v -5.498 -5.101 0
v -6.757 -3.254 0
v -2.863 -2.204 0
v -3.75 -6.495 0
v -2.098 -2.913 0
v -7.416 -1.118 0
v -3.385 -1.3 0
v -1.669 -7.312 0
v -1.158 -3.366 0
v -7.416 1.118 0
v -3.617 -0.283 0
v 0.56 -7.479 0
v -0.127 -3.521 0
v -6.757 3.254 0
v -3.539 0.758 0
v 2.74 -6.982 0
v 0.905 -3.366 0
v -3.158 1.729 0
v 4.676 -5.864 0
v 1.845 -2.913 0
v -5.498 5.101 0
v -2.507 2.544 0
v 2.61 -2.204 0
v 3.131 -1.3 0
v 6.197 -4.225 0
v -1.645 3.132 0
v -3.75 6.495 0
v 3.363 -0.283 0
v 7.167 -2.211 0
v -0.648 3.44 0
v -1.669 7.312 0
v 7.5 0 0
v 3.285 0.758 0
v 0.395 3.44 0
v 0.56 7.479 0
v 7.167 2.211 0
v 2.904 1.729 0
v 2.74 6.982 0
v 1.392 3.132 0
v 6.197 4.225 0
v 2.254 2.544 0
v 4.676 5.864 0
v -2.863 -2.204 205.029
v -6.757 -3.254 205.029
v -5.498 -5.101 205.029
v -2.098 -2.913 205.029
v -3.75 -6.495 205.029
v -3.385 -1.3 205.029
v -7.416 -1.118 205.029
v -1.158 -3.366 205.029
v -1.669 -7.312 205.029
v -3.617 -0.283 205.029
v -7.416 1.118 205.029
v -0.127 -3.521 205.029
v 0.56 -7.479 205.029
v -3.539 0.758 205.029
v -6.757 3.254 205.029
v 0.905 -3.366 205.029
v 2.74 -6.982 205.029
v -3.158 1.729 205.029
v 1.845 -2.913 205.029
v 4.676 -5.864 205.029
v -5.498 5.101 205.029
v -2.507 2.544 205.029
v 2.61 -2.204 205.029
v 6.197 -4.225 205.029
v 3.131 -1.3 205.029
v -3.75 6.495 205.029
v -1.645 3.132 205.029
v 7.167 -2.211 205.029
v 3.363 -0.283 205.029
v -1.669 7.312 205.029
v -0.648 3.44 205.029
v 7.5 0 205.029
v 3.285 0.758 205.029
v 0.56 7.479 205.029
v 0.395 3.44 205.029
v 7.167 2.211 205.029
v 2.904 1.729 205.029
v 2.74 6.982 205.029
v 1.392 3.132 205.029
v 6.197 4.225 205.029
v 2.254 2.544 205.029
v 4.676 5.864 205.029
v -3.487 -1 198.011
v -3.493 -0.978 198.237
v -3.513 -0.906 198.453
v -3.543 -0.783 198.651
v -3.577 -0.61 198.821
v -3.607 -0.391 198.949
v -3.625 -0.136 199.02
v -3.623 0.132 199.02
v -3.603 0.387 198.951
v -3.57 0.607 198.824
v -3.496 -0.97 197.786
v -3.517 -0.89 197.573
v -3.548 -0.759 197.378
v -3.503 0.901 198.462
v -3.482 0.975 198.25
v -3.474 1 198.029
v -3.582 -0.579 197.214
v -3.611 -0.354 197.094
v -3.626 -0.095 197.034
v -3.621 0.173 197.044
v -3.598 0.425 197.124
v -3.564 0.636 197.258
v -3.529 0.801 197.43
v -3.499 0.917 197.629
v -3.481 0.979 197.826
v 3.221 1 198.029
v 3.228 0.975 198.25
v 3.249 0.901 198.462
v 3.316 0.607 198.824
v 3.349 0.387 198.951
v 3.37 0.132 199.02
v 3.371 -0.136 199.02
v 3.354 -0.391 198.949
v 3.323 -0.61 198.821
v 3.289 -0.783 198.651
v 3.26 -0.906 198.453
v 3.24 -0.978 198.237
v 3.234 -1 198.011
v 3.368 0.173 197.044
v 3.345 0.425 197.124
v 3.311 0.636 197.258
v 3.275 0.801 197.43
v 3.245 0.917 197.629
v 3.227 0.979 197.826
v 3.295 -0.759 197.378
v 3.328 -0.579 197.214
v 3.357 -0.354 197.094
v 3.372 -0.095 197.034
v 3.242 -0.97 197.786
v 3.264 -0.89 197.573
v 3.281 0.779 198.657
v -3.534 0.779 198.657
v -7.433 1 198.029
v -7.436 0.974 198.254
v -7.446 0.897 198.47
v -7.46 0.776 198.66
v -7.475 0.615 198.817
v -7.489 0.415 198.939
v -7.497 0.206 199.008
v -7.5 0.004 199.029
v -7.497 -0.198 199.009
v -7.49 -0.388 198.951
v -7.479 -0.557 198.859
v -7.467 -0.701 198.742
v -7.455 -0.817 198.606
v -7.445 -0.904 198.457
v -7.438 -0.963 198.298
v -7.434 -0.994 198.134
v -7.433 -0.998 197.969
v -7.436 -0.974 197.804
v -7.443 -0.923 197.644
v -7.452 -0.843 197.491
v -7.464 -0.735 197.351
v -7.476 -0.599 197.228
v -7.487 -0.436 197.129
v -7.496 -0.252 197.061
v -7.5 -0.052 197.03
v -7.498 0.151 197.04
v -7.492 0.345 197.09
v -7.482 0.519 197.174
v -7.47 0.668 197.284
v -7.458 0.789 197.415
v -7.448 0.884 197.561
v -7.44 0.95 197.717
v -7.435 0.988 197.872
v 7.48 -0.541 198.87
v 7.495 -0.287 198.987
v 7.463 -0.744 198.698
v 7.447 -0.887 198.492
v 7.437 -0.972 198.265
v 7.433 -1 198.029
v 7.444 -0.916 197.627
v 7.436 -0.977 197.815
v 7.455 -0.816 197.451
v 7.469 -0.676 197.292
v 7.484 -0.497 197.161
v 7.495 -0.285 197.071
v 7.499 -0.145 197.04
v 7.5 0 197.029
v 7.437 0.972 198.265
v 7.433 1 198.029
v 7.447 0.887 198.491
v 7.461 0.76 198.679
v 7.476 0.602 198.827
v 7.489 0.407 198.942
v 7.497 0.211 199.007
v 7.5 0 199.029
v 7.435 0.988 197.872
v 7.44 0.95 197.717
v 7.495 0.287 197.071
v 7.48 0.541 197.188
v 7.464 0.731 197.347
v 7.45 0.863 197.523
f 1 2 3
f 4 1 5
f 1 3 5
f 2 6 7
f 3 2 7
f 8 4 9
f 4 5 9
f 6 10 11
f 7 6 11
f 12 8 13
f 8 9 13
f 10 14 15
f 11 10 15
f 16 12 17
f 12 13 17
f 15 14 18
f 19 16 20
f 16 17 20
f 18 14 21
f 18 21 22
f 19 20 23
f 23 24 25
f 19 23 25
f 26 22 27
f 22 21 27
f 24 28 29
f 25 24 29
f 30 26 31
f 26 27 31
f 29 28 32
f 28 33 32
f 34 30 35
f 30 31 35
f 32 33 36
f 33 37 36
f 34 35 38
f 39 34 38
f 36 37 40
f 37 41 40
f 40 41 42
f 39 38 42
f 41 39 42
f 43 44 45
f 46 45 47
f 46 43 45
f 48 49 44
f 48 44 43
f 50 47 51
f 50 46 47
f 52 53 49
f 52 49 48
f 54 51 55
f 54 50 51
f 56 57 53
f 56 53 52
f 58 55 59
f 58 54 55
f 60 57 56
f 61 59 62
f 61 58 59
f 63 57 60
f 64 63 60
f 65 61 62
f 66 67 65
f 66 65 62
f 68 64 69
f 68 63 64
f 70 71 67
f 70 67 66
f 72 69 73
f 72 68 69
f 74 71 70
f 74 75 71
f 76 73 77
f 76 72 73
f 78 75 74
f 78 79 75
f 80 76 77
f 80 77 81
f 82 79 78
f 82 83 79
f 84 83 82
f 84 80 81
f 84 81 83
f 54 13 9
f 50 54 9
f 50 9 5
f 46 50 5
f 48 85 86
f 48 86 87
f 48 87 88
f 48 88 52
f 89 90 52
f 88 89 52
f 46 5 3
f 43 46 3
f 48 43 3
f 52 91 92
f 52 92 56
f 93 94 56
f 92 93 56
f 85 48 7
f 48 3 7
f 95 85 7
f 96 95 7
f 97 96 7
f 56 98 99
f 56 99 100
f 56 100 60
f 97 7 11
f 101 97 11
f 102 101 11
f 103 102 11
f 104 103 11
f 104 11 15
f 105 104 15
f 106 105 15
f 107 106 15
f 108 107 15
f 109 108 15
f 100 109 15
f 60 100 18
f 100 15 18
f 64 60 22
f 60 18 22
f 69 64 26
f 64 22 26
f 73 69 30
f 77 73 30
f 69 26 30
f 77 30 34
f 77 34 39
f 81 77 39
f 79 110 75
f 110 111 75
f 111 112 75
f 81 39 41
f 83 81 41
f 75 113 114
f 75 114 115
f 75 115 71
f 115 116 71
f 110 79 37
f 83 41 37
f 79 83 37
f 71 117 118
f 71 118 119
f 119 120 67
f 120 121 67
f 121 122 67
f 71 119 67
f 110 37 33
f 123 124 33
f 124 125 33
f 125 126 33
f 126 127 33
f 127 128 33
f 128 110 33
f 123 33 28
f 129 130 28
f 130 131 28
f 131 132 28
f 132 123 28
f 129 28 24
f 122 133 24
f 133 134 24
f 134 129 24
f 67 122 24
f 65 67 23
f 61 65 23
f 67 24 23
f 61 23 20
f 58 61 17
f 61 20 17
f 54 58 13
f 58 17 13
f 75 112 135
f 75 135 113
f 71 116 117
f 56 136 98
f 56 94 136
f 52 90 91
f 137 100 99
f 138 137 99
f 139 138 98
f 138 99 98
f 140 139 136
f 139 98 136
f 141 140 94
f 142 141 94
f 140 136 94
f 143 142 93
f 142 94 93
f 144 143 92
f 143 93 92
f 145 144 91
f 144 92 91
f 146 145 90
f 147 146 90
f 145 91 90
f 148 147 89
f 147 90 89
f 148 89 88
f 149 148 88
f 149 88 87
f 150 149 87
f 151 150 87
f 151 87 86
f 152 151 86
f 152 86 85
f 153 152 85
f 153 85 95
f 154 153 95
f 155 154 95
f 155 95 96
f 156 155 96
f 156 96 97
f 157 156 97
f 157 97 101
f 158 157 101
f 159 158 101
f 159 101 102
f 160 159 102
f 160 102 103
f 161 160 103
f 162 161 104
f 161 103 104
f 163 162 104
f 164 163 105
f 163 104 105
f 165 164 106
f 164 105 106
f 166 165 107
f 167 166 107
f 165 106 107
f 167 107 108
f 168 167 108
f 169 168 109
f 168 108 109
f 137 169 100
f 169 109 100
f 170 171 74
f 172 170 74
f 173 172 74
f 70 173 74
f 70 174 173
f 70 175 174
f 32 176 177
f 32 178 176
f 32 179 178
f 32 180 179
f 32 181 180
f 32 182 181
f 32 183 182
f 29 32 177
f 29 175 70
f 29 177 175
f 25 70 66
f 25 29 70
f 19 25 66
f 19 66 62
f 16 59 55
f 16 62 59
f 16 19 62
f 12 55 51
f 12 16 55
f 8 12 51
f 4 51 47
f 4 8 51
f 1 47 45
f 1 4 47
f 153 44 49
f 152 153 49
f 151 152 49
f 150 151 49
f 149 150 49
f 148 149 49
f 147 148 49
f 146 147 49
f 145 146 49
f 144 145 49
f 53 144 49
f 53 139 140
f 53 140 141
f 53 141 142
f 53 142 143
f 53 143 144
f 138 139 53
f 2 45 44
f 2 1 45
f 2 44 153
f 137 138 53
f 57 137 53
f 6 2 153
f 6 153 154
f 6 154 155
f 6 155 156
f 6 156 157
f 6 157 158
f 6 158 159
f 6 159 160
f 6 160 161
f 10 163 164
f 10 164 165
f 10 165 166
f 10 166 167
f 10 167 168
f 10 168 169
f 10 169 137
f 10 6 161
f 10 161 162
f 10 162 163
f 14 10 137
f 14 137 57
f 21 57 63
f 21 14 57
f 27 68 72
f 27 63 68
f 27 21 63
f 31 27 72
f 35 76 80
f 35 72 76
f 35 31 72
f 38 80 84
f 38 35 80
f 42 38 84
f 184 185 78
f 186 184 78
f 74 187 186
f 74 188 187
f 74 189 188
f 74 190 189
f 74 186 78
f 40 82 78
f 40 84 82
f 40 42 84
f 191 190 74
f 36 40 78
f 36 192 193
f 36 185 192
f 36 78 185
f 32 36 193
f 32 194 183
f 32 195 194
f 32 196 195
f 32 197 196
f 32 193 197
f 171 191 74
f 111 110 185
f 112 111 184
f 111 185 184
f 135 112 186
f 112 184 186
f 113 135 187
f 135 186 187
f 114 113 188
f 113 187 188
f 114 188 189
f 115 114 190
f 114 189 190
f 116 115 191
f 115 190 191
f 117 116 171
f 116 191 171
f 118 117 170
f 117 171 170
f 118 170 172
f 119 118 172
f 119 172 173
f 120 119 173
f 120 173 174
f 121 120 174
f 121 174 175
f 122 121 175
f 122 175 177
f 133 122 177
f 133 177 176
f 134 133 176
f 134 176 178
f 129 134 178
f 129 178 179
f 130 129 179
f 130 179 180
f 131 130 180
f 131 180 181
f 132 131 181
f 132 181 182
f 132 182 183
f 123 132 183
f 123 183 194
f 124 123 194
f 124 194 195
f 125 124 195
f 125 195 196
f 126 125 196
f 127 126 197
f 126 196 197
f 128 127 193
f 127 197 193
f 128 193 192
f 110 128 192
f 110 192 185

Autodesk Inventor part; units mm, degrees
ref_plane "XZ Plane" through (0, 0, 0) normal (0, 1, 0) x (-1, 0, 0)
ref_plane "XY Plane" through (0, 0, 0) normal (0, 0, 1) x (1, 0, 0)
sketch "Sketch1" plane through (0, 0, 0) normal (0, 0, 1) x (1, 0, 0)
  circle A0 centre (0, 0) radius 7.5
  dimension "d0" = 15
extrude "Extrusion1" add sketch "Sketch1" along normal blind 205.029
sketch "Sketch2" plane through (0, 0, 205.029) normal (0, 0, 1) x (1, 0, 0)
  point P0 (0, 0)
  point P1 (-0.1268, -0.0213)
hole "Hole1" at (-0.1268, -0.0213, 205.029) direction (0, 0, -1) diameter 7 end through all
ref_plane "Work Plane1" through (7.5, 0, 0) normal (1, 0, 0) x (0, 1, 0)
sketch "Sketch3" plane through (7.5, 0, 0) normal (1, 0, 0) x (0, 1, 0)
  circle A0 centre (0, 198.029) radius 1
  line L0 (7.5, 205.029) -> (-7.5, 205.029) projected
  point P0 (0, 0)
  dimension "d10" = 2
  dimension "d11" = 7
extrude "Extrusion2" cut sketch "Sketch3" against normal through all
properties part number "shaft" material "Nylon 6/6"
